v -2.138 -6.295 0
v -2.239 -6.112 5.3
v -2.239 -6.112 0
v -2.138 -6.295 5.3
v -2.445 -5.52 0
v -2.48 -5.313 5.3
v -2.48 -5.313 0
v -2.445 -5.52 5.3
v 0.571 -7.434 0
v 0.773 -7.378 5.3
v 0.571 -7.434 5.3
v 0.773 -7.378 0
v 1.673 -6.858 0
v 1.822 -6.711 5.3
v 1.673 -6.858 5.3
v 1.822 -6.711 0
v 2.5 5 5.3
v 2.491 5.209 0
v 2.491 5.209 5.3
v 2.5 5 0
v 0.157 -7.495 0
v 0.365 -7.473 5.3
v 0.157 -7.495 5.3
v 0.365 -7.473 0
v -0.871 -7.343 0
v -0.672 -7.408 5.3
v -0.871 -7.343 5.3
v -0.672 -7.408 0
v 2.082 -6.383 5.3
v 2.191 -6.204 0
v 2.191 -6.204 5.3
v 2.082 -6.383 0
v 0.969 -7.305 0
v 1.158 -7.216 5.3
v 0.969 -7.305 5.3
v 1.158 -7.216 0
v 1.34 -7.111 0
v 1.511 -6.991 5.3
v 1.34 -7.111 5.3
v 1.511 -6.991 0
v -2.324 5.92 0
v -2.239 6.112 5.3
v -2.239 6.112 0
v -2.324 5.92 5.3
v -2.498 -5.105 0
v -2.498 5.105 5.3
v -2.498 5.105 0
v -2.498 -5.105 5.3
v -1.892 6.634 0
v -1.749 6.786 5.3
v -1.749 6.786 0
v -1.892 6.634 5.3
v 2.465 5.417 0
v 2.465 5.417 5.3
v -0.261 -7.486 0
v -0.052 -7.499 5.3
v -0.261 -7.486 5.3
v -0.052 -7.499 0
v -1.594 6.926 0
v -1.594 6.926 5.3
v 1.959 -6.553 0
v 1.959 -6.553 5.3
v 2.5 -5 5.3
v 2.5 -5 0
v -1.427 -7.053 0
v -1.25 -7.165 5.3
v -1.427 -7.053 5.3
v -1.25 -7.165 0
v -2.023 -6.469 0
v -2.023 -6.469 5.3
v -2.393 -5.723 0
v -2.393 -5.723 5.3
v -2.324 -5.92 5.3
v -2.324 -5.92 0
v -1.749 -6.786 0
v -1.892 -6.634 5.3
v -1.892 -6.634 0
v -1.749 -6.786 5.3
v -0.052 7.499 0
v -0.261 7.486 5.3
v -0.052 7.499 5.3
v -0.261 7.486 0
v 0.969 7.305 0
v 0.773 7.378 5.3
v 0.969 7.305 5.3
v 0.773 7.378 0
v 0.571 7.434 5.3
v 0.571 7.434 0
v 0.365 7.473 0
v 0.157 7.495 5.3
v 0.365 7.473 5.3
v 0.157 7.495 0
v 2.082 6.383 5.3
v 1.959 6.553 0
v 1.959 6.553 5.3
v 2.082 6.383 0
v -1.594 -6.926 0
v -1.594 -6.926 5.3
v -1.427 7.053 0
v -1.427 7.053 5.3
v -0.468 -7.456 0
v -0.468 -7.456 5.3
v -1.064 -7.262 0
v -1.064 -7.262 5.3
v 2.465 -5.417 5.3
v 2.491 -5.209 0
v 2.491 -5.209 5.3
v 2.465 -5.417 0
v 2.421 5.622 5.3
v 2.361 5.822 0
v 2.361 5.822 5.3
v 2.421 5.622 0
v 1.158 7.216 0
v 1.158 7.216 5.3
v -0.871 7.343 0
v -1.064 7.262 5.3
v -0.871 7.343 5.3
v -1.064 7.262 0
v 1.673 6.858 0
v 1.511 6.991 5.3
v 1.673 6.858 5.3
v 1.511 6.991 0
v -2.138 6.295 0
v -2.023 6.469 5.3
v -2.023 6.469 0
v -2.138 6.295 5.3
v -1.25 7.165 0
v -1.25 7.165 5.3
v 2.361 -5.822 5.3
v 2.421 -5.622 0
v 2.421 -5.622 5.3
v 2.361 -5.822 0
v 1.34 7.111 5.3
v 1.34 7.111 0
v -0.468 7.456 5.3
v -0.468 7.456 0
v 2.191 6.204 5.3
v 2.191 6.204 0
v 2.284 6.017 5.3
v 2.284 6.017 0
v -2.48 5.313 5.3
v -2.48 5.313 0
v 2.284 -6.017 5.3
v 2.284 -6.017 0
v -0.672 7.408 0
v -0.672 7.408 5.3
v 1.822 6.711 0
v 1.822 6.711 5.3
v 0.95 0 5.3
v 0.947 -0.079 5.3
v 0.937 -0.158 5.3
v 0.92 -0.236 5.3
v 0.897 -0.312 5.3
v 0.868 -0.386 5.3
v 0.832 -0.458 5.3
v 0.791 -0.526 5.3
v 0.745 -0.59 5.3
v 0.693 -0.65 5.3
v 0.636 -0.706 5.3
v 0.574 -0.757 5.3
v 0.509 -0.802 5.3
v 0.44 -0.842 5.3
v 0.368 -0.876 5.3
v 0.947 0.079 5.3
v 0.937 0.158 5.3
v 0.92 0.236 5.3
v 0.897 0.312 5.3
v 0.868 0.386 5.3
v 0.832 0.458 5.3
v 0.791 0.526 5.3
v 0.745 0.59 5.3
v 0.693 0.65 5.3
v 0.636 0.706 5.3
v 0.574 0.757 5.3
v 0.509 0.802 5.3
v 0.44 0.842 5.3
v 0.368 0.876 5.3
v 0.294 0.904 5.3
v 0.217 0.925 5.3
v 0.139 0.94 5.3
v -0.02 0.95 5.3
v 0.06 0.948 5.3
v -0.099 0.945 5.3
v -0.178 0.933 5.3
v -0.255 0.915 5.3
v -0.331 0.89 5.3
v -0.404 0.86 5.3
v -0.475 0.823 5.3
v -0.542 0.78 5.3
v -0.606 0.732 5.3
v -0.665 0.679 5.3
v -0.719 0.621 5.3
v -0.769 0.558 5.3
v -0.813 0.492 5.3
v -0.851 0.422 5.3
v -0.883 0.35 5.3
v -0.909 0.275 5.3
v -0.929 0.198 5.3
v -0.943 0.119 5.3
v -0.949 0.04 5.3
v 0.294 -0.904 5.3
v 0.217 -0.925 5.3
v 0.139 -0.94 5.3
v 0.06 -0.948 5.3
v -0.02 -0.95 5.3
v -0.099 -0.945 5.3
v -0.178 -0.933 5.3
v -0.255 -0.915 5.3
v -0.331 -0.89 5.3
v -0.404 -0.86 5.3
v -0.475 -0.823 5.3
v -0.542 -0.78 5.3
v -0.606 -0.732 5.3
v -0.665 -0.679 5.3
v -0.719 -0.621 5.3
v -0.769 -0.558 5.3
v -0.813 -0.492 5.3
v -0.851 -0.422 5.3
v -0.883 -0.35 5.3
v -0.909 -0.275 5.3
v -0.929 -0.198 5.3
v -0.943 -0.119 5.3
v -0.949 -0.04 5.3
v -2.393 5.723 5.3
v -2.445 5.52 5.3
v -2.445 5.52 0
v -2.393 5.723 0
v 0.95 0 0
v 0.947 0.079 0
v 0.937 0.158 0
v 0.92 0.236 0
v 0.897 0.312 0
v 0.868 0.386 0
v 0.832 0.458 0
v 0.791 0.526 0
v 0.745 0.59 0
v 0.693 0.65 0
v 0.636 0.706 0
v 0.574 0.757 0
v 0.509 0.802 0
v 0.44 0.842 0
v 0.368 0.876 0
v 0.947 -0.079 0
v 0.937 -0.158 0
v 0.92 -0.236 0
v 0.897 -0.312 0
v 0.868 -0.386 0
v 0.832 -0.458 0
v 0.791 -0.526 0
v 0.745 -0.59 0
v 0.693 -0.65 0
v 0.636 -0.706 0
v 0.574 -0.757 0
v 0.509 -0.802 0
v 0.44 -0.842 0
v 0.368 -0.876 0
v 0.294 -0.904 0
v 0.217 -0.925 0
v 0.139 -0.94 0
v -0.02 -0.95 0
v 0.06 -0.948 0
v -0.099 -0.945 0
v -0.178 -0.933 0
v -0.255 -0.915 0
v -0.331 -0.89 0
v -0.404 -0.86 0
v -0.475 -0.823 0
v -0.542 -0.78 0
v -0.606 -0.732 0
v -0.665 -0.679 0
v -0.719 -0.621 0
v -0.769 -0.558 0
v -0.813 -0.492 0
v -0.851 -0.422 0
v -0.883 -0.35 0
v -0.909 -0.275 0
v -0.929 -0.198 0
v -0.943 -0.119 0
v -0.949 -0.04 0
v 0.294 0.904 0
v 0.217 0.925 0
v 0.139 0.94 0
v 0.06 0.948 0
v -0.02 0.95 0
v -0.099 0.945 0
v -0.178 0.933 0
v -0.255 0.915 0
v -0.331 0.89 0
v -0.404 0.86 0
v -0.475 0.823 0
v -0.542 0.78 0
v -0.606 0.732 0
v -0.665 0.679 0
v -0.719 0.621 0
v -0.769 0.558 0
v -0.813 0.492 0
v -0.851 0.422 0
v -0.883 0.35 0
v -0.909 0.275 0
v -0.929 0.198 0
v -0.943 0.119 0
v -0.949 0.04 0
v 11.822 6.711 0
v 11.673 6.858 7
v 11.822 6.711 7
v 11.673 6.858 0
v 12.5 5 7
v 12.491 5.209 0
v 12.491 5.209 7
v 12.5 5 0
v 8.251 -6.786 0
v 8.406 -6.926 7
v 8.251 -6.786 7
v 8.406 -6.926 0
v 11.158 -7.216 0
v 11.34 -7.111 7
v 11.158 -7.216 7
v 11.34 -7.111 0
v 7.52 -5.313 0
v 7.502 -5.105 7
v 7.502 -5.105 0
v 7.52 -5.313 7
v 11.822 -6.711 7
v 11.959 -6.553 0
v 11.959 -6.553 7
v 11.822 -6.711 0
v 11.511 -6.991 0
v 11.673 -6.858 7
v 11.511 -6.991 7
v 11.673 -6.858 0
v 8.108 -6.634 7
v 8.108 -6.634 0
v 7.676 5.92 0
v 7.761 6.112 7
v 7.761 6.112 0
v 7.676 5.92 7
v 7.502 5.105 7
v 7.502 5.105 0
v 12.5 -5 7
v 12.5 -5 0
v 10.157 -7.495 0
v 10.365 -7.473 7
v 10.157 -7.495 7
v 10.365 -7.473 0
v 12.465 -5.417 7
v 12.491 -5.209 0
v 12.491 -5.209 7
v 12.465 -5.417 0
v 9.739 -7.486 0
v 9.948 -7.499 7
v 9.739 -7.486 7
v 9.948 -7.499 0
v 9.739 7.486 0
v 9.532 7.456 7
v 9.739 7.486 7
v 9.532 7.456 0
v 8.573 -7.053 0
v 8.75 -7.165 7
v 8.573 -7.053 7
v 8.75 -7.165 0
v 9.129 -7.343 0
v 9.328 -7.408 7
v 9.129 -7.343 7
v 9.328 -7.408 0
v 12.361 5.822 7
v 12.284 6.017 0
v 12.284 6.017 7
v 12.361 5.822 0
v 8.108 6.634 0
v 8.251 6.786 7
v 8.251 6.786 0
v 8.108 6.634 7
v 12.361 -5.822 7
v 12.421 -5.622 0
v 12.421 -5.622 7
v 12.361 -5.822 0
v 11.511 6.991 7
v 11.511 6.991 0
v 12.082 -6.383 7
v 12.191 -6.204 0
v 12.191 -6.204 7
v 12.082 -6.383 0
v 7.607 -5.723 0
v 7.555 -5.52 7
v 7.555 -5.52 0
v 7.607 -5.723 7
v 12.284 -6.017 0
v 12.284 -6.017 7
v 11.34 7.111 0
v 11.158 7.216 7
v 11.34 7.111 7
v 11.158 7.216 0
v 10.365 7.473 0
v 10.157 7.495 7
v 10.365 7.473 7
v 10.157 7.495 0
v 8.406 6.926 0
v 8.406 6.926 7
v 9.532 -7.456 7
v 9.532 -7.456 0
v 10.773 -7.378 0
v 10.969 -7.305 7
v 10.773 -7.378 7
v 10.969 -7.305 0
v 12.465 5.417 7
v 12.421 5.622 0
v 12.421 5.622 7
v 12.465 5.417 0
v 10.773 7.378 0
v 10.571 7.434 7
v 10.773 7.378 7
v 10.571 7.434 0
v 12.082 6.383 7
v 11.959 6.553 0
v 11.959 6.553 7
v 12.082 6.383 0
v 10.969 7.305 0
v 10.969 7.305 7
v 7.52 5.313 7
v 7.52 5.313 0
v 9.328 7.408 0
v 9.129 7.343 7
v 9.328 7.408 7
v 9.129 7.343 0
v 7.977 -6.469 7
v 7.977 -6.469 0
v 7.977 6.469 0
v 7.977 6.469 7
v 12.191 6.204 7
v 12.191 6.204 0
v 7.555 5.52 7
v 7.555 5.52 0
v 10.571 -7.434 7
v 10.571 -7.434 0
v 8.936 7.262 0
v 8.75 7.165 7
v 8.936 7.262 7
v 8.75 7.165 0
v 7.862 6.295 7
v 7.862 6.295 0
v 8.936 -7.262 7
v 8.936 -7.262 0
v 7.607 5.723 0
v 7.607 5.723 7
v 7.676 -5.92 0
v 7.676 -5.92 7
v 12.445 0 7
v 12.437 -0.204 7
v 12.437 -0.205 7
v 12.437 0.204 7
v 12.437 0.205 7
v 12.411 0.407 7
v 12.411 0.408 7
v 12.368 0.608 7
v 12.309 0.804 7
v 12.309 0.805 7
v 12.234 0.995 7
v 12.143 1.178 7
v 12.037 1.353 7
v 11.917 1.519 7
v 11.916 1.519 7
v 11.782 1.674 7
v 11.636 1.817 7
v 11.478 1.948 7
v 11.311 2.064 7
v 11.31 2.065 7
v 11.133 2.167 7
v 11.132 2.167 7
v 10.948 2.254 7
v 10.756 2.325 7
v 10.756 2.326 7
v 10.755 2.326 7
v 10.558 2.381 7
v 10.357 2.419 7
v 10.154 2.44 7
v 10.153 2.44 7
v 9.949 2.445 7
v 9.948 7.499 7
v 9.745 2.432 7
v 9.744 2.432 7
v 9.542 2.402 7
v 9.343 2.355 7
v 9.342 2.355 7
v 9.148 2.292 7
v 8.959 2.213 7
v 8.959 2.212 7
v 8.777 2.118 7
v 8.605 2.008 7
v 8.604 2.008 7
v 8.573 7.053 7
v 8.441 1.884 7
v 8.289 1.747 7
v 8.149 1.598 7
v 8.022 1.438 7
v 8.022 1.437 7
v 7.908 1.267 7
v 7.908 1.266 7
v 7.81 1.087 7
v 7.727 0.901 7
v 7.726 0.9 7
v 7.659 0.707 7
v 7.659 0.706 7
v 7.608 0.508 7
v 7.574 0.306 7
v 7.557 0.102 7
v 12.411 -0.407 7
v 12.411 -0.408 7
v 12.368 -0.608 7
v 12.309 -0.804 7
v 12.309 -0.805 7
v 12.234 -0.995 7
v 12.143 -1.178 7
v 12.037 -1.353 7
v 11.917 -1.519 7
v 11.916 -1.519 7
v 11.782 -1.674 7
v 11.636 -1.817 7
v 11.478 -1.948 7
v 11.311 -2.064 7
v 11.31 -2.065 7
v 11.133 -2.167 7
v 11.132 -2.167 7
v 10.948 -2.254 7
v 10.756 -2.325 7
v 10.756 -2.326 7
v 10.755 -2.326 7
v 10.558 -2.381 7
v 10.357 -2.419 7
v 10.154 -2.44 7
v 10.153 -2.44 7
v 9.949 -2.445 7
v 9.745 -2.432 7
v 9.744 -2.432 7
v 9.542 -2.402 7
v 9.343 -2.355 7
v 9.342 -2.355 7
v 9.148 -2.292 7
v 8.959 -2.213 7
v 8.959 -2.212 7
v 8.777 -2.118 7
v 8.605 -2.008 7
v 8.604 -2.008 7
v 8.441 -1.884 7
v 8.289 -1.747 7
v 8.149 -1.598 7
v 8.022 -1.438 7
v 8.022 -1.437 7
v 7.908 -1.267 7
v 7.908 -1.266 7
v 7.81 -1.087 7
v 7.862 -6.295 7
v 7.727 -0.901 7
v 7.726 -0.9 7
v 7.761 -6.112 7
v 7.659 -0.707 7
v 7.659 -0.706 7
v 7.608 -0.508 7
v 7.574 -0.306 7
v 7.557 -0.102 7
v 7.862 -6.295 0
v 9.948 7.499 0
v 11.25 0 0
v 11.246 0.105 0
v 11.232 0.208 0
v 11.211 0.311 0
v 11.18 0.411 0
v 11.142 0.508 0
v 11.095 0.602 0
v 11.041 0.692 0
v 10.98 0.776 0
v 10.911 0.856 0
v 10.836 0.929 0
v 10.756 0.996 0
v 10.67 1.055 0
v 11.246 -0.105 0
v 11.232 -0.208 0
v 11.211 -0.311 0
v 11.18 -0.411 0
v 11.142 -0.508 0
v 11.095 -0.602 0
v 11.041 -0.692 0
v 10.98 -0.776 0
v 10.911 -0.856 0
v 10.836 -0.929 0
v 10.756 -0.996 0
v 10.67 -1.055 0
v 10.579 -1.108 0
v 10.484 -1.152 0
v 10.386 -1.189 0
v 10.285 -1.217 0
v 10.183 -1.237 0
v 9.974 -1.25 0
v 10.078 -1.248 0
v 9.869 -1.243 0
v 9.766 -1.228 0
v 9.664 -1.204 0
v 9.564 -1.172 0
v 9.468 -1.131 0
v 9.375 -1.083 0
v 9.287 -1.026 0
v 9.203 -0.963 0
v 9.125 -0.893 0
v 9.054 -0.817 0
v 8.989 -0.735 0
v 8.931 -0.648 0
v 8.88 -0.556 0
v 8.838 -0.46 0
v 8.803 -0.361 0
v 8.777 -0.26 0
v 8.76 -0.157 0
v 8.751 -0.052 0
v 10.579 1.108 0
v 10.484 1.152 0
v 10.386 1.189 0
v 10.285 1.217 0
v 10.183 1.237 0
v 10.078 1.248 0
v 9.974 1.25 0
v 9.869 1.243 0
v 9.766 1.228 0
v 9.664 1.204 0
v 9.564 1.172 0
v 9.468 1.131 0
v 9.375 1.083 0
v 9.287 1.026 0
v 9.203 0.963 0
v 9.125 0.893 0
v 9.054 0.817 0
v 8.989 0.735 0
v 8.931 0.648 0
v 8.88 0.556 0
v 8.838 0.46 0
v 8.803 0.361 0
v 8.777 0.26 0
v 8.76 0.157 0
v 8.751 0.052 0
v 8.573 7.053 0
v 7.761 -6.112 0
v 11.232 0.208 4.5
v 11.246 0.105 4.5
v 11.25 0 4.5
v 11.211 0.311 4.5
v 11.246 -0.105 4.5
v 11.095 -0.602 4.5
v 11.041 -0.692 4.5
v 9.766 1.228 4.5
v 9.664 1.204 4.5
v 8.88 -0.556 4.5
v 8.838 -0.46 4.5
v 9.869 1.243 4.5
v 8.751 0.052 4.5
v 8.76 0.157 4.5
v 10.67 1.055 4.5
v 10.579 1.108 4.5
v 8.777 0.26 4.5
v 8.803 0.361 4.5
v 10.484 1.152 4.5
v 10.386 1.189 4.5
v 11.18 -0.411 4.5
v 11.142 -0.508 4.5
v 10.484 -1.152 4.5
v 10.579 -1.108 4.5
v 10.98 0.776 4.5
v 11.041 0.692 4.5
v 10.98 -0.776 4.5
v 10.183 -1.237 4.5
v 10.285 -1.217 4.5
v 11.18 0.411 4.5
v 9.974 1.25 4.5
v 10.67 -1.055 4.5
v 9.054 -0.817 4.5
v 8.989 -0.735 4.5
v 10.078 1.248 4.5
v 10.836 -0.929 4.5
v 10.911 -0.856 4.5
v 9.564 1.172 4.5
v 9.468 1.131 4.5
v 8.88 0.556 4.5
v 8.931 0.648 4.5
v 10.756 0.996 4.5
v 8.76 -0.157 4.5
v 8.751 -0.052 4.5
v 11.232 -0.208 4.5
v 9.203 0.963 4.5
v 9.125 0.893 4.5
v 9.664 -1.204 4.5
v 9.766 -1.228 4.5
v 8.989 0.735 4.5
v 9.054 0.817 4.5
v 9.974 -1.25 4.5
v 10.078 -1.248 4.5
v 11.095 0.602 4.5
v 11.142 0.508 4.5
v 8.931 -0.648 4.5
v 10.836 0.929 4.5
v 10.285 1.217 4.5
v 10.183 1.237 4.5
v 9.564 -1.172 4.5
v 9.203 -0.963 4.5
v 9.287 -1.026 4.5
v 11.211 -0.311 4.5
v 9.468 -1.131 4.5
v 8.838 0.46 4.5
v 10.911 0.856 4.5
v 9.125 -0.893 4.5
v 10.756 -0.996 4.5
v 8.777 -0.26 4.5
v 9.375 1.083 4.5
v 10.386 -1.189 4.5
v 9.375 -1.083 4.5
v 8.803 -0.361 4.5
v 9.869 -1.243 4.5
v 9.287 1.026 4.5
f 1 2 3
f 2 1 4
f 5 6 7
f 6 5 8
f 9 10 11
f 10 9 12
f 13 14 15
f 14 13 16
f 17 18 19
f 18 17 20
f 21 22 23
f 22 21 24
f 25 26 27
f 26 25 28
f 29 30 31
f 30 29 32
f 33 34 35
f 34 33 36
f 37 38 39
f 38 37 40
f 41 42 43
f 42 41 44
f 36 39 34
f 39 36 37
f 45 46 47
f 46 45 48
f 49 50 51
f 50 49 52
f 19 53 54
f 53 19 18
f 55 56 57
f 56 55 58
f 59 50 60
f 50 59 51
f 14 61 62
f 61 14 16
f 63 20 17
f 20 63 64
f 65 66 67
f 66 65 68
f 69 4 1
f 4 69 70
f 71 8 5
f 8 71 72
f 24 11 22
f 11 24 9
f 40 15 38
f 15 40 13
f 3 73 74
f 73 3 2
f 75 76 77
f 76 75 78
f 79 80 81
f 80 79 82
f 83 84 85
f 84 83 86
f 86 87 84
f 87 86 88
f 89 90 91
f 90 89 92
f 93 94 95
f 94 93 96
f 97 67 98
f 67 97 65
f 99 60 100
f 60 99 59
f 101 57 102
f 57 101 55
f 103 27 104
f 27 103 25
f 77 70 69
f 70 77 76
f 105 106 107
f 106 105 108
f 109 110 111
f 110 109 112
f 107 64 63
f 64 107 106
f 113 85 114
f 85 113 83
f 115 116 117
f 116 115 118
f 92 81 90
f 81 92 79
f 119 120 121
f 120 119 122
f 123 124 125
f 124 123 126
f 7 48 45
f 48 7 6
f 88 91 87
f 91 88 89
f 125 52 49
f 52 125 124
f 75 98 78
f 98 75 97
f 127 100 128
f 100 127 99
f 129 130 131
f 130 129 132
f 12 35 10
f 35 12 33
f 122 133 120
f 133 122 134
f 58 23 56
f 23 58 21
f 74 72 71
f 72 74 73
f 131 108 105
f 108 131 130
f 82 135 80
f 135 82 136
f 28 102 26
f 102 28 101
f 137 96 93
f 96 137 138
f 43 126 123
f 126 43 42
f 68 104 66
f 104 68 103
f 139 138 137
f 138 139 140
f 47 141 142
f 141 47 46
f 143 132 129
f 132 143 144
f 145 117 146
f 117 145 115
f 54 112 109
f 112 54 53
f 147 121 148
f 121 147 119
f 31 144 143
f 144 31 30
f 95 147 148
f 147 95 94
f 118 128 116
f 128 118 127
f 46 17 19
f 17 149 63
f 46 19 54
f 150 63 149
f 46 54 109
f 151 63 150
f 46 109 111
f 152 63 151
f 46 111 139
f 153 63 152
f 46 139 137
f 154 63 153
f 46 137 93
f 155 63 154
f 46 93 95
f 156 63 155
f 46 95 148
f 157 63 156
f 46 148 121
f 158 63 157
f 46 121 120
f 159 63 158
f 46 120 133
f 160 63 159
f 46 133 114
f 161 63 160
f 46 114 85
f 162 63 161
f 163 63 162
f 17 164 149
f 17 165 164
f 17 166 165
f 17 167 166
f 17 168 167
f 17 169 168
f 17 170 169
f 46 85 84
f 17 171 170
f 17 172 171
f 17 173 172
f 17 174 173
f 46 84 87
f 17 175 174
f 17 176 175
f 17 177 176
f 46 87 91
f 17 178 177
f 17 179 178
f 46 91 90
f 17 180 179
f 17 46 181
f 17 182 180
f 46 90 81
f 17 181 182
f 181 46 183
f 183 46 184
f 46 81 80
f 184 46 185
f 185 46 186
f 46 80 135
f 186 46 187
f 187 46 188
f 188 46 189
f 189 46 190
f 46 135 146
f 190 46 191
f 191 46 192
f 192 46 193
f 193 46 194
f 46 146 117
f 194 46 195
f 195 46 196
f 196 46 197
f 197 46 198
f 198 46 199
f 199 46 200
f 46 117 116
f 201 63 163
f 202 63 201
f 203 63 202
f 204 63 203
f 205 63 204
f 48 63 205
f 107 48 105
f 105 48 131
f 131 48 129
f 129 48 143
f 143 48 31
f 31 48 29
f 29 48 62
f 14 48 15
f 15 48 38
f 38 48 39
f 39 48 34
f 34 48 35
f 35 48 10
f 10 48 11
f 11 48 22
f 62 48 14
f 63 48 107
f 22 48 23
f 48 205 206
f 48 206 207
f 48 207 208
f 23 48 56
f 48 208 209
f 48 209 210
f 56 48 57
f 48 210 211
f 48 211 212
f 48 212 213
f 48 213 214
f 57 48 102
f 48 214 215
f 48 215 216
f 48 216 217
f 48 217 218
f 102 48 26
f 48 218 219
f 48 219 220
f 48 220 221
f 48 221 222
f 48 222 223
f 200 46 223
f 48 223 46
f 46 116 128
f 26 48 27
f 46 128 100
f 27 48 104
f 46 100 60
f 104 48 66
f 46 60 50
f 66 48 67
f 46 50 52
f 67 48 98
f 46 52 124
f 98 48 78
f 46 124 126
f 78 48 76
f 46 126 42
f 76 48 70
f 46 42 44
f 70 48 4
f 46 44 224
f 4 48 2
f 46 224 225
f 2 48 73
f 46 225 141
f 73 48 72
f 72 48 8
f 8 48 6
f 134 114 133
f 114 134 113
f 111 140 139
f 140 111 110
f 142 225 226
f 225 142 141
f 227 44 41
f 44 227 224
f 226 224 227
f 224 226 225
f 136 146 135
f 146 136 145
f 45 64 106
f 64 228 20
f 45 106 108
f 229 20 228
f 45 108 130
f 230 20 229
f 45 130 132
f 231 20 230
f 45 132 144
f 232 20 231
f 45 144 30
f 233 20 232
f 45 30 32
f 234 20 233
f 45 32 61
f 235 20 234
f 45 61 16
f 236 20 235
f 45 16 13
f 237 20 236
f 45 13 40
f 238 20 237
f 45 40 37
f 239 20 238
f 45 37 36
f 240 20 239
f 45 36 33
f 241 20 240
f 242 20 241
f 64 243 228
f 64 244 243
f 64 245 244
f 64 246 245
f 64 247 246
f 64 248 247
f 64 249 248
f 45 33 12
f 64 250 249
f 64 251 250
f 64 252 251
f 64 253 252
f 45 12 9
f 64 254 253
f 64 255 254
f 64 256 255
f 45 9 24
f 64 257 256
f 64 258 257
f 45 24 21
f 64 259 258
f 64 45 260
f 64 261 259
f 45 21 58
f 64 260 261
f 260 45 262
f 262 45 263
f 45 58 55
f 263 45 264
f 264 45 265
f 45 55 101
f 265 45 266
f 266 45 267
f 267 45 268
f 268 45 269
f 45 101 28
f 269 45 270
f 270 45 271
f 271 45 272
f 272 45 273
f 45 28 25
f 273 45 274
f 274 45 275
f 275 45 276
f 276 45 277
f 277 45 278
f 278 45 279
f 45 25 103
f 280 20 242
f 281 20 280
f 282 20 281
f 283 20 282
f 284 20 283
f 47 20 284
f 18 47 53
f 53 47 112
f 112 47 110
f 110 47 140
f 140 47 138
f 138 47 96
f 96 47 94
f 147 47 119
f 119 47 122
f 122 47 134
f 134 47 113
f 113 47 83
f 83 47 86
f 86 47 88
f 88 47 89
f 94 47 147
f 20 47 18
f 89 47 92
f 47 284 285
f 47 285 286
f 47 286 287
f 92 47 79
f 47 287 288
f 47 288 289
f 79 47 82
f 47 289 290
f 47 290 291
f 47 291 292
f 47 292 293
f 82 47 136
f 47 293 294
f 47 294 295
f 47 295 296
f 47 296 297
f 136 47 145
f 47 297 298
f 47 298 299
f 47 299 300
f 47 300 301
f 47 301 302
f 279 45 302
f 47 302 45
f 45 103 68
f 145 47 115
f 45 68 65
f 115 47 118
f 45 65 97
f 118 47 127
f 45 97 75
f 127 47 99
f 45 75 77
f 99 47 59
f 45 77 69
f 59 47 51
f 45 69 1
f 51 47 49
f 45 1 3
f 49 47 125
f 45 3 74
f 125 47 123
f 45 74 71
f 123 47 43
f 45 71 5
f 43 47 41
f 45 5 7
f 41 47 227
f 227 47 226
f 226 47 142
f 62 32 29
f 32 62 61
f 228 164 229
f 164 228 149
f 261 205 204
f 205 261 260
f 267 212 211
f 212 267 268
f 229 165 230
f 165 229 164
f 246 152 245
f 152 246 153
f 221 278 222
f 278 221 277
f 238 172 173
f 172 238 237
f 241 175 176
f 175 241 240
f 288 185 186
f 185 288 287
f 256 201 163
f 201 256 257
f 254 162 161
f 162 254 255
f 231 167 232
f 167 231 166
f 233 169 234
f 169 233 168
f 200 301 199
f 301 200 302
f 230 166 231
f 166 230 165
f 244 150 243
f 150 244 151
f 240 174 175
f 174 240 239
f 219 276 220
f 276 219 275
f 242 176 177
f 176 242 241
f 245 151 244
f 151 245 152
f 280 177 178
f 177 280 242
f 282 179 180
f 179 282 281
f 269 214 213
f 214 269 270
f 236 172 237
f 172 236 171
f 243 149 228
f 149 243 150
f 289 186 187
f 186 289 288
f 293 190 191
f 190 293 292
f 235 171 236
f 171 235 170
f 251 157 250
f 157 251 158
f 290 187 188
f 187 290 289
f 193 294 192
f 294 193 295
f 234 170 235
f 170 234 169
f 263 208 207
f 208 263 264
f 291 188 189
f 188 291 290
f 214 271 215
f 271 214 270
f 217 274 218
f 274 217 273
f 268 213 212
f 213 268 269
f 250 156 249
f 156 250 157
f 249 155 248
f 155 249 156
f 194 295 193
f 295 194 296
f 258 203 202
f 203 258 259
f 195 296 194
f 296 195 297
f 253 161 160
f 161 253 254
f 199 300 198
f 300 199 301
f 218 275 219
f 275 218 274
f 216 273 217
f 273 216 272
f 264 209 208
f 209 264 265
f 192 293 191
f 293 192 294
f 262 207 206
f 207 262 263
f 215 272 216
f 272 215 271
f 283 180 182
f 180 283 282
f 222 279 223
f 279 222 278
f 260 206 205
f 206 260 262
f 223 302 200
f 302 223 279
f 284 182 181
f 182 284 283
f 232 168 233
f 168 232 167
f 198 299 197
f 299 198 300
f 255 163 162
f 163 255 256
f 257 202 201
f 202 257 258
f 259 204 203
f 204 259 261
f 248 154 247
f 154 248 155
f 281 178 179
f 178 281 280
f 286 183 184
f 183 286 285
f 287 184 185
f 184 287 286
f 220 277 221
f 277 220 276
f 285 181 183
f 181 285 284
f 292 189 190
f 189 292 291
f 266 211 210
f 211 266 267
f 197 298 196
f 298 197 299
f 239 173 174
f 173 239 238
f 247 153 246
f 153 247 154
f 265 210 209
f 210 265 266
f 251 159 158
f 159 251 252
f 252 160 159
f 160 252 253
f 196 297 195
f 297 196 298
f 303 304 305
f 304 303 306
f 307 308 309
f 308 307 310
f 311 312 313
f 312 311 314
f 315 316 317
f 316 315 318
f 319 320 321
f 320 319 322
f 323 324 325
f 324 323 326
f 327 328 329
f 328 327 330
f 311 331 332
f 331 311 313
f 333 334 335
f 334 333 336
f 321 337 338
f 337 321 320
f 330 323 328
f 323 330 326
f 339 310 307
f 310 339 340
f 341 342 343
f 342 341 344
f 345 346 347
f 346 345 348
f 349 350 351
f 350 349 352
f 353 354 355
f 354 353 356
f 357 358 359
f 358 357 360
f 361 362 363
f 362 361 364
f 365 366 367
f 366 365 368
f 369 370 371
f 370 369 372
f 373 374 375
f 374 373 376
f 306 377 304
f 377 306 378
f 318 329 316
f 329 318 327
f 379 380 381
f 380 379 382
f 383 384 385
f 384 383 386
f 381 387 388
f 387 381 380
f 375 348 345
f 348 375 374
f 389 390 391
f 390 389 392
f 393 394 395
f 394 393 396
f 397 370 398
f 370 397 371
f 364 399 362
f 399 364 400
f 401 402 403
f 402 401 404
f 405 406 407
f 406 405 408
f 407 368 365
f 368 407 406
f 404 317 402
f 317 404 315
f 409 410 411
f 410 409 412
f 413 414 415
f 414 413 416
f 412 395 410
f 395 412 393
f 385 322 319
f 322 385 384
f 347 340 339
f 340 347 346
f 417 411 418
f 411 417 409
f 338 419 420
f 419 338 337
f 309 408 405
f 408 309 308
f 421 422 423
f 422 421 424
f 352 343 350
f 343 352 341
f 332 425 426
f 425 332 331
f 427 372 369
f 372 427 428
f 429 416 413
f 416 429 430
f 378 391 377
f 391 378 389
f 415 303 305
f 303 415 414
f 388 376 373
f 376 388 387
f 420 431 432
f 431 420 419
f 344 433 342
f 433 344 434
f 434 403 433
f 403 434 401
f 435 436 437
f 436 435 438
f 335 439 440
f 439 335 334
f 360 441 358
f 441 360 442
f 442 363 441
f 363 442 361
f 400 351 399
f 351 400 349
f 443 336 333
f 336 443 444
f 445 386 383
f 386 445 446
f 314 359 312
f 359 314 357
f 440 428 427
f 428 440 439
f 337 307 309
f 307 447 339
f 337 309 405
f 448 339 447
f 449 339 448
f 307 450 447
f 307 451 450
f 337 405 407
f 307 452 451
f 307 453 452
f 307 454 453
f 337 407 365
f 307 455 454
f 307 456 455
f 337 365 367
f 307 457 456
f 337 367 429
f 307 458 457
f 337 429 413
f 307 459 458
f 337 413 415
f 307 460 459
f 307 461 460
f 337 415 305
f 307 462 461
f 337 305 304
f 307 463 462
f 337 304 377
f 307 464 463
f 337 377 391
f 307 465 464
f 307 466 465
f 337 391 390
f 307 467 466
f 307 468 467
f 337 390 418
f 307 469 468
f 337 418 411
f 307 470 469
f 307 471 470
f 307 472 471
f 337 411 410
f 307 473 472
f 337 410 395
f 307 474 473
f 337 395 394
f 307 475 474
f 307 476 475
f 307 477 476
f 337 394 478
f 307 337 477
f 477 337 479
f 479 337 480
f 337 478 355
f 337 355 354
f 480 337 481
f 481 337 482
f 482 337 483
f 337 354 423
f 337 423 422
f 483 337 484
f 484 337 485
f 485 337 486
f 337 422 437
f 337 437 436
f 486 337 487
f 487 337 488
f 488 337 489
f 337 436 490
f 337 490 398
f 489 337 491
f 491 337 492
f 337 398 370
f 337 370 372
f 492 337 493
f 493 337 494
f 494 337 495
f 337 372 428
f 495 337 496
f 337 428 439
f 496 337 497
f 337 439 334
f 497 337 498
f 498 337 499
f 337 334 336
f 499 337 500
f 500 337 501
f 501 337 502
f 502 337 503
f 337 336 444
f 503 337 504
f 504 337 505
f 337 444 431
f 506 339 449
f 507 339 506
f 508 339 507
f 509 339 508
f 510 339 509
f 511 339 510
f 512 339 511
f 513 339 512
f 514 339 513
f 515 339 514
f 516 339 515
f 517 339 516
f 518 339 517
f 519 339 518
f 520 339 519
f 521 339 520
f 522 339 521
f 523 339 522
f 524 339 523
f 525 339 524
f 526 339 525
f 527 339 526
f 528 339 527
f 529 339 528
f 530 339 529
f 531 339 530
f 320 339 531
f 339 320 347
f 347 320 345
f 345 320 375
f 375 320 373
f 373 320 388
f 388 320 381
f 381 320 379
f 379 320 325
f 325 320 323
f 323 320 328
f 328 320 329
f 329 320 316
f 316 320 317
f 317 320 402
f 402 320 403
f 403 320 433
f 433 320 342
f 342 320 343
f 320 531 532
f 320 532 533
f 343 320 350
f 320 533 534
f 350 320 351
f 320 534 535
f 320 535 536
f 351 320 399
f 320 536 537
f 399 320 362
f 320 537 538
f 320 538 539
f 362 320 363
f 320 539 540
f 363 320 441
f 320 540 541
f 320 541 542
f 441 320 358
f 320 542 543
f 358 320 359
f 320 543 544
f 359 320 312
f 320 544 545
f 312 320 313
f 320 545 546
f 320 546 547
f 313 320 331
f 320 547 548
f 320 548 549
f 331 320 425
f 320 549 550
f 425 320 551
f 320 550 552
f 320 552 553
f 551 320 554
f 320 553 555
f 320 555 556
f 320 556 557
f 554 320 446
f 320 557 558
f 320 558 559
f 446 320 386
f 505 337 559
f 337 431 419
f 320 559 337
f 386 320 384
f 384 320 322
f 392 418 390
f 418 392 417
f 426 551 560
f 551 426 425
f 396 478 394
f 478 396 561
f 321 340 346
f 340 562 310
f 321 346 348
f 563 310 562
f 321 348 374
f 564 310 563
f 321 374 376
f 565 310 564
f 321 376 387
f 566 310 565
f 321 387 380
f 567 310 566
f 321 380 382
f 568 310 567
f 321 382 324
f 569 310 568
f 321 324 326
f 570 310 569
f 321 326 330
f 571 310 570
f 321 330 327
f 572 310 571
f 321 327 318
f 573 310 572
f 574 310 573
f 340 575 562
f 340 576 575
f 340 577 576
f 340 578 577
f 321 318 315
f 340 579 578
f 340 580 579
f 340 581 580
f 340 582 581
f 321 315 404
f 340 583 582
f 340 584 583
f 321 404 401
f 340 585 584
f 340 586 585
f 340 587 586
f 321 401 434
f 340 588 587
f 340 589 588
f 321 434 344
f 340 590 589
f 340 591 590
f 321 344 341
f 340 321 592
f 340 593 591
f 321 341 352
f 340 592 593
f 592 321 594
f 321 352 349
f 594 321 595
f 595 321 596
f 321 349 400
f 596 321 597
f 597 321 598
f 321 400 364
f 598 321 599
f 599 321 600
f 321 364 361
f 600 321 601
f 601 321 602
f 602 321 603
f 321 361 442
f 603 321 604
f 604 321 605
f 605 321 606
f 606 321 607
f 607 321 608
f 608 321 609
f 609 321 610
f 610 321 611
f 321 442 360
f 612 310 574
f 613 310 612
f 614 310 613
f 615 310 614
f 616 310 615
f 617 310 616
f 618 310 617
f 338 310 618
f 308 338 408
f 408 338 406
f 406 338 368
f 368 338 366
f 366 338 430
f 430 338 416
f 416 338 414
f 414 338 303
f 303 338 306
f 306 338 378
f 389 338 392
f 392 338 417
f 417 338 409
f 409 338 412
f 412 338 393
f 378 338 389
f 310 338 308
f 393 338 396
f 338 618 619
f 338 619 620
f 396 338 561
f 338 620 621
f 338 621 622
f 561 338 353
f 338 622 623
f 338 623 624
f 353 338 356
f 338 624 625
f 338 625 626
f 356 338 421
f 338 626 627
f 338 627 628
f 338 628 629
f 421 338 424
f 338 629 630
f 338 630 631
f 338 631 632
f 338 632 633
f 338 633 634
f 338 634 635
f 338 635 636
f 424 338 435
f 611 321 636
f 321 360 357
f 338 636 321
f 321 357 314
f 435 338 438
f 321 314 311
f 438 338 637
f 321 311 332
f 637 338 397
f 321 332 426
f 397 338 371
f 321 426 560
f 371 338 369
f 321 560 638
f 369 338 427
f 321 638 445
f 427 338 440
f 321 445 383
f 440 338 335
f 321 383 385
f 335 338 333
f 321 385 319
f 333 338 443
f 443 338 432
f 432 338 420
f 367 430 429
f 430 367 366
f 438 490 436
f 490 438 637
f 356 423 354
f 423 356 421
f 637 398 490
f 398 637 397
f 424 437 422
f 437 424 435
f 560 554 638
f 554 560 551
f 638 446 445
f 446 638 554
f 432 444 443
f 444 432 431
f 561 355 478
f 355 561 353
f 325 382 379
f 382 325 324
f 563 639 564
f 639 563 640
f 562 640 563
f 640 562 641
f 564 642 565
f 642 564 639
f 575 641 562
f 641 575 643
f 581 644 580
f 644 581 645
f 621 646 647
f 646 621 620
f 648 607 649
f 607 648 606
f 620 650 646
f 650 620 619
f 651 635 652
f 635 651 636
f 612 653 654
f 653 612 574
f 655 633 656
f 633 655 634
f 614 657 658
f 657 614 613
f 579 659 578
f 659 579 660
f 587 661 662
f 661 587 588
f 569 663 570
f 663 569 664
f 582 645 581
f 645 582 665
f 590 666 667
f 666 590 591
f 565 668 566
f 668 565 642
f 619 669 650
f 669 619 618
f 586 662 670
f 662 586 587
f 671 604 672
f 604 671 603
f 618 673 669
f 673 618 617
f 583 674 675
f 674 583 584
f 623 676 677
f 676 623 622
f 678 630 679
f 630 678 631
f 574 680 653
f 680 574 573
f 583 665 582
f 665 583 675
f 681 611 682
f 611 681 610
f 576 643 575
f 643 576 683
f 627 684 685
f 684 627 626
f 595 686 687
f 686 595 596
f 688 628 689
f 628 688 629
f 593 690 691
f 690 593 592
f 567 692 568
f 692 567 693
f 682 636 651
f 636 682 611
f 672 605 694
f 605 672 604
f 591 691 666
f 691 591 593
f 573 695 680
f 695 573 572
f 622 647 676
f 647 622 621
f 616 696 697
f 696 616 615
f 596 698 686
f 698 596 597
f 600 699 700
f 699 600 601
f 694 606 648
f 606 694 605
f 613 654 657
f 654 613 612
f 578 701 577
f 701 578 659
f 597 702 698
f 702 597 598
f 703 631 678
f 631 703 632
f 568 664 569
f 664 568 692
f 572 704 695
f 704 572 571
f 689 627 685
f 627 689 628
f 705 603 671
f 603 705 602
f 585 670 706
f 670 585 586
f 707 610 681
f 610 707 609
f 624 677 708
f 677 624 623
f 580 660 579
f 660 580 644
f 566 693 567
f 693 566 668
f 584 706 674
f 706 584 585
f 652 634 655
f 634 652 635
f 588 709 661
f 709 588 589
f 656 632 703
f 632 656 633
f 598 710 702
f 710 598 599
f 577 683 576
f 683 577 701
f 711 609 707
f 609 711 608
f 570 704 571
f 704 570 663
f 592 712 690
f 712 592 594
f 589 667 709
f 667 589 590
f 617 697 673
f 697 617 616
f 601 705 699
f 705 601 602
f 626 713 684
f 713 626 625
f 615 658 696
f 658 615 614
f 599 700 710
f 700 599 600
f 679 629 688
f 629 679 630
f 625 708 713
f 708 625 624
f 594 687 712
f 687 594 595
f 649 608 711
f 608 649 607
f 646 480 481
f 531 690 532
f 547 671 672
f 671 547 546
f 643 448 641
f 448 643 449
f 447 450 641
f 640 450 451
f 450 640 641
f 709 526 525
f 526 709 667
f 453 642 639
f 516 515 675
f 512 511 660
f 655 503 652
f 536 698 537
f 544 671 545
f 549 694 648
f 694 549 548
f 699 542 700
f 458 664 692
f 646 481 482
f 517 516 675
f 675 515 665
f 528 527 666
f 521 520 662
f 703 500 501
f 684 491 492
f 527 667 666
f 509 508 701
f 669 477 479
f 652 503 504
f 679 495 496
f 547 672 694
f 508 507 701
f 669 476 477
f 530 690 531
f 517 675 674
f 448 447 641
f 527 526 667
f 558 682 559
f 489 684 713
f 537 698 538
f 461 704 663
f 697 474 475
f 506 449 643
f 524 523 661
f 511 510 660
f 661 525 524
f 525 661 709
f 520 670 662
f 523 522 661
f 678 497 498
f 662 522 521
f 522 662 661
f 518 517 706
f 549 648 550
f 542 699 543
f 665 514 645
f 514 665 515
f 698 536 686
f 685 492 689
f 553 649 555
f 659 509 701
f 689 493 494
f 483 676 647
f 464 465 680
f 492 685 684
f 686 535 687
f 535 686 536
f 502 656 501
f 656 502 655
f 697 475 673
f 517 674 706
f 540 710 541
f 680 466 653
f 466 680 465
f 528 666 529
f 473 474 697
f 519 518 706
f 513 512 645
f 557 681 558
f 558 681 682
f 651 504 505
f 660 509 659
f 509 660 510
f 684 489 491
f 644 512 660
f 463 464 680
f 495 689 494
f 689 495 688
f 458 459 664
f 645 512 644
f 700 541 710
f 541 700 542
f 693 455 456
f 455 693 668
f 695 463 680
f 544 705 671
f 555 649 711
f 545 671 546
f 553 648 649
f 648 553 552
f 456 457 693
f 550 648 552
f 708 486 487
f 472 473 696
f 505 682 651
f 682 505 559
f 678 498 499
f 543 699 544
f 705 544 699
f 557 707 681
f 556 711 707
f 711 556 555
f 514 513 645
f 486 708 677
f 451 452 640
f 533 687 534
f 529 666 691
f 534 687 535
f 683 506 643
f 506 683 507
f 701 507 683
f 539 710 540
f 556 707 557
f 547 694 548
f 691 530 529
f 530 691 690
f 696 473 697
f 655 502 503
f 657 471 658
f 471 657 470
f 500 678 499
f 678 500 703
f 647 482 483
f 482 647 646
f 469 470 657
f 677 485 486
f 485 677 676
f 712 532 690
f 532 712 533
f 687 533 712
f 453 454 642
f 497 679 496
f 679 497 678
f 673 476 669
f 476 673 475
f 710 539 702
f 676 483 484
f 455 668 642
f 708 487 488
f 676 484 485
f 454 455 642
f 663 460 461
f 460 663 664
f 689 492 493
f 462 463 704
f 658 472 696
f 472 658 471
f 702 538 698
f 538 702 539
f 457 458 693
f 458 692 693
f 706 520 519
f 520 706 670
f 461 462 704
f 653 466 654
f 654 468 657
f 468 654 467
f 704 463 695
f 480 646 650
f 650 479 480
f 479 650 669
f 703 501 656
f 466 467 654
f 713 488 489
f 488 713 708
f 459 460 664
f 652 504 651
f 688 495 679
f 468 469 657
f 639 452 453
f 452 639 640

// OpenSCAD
$fn = $preview ? 25 : 75;

magic = 0.01;
clipX = 5;
clipY = 15;
clipH = 5.3; // i.e. IKEA Skådis plate thickness
clipTolerance = .3;
clipCoreD1 = 1.9; // attaching section
clipCoreD2 = 2.5; // free rotating section
clipCoreD3 = 4.9; // screw head max D
clipCoreH3 = 2.5; // screw head H
clipTopH = 7;

// Sample:
// translate([ 0, 0, 3 / -2 ])
// difference() {
//   cube([ 8, 18, 3 ], center = true);
//   translate([ 0, 0, -10 ]) cylinder(d = clipCoreD1, h = 20);
// }
// clipTwisted();

// For printing:
clipTwisted(bottom = true, top = false);
translate([ 10, 0, -clipH - clipTolerance ])
clipTwisted(bottom = false, top = true);


module clipTwisted(bottom = true, top = true) {
  color("Chocolate") { // https://en.wikibooks.org/wiki/OpenSCAD_User_Manual/Transformations#color
    if (bottom)
    difference() {
      // Base:
      clipTwistedBody();

      // Screw hole:
      cylinder(d = clipCoreD1, h = clipH + magic);
    }

    if (top)
    translate([ 0, 0, clipH + clipTolerance ])
    difference() {
      // Base:
      clipTwistedBody(clipTopH);

      // Screw hole:
      cylinder(d = clipCoreD2, h = clipTopH + magic);

      // Screw head hole:
      translate([ 0, 0, clipTopH - clipCoreH3 ])
      #cylinder(d1 = clipCoreD2, d2 = clipCoreD3, h = clipCoreH3 + magic);
    }
  }
}


module clipTwistedBody(height = clipH) {
  hull() {
    translate([ 0, (clipY - clipX) / 2, 0 ])
    cylinder(d = clipX, h = height);
    translate([ 0, (clipY - clipX) / -2, 0 ])
    cylinder(d = clipX, h = height);
  }
}
